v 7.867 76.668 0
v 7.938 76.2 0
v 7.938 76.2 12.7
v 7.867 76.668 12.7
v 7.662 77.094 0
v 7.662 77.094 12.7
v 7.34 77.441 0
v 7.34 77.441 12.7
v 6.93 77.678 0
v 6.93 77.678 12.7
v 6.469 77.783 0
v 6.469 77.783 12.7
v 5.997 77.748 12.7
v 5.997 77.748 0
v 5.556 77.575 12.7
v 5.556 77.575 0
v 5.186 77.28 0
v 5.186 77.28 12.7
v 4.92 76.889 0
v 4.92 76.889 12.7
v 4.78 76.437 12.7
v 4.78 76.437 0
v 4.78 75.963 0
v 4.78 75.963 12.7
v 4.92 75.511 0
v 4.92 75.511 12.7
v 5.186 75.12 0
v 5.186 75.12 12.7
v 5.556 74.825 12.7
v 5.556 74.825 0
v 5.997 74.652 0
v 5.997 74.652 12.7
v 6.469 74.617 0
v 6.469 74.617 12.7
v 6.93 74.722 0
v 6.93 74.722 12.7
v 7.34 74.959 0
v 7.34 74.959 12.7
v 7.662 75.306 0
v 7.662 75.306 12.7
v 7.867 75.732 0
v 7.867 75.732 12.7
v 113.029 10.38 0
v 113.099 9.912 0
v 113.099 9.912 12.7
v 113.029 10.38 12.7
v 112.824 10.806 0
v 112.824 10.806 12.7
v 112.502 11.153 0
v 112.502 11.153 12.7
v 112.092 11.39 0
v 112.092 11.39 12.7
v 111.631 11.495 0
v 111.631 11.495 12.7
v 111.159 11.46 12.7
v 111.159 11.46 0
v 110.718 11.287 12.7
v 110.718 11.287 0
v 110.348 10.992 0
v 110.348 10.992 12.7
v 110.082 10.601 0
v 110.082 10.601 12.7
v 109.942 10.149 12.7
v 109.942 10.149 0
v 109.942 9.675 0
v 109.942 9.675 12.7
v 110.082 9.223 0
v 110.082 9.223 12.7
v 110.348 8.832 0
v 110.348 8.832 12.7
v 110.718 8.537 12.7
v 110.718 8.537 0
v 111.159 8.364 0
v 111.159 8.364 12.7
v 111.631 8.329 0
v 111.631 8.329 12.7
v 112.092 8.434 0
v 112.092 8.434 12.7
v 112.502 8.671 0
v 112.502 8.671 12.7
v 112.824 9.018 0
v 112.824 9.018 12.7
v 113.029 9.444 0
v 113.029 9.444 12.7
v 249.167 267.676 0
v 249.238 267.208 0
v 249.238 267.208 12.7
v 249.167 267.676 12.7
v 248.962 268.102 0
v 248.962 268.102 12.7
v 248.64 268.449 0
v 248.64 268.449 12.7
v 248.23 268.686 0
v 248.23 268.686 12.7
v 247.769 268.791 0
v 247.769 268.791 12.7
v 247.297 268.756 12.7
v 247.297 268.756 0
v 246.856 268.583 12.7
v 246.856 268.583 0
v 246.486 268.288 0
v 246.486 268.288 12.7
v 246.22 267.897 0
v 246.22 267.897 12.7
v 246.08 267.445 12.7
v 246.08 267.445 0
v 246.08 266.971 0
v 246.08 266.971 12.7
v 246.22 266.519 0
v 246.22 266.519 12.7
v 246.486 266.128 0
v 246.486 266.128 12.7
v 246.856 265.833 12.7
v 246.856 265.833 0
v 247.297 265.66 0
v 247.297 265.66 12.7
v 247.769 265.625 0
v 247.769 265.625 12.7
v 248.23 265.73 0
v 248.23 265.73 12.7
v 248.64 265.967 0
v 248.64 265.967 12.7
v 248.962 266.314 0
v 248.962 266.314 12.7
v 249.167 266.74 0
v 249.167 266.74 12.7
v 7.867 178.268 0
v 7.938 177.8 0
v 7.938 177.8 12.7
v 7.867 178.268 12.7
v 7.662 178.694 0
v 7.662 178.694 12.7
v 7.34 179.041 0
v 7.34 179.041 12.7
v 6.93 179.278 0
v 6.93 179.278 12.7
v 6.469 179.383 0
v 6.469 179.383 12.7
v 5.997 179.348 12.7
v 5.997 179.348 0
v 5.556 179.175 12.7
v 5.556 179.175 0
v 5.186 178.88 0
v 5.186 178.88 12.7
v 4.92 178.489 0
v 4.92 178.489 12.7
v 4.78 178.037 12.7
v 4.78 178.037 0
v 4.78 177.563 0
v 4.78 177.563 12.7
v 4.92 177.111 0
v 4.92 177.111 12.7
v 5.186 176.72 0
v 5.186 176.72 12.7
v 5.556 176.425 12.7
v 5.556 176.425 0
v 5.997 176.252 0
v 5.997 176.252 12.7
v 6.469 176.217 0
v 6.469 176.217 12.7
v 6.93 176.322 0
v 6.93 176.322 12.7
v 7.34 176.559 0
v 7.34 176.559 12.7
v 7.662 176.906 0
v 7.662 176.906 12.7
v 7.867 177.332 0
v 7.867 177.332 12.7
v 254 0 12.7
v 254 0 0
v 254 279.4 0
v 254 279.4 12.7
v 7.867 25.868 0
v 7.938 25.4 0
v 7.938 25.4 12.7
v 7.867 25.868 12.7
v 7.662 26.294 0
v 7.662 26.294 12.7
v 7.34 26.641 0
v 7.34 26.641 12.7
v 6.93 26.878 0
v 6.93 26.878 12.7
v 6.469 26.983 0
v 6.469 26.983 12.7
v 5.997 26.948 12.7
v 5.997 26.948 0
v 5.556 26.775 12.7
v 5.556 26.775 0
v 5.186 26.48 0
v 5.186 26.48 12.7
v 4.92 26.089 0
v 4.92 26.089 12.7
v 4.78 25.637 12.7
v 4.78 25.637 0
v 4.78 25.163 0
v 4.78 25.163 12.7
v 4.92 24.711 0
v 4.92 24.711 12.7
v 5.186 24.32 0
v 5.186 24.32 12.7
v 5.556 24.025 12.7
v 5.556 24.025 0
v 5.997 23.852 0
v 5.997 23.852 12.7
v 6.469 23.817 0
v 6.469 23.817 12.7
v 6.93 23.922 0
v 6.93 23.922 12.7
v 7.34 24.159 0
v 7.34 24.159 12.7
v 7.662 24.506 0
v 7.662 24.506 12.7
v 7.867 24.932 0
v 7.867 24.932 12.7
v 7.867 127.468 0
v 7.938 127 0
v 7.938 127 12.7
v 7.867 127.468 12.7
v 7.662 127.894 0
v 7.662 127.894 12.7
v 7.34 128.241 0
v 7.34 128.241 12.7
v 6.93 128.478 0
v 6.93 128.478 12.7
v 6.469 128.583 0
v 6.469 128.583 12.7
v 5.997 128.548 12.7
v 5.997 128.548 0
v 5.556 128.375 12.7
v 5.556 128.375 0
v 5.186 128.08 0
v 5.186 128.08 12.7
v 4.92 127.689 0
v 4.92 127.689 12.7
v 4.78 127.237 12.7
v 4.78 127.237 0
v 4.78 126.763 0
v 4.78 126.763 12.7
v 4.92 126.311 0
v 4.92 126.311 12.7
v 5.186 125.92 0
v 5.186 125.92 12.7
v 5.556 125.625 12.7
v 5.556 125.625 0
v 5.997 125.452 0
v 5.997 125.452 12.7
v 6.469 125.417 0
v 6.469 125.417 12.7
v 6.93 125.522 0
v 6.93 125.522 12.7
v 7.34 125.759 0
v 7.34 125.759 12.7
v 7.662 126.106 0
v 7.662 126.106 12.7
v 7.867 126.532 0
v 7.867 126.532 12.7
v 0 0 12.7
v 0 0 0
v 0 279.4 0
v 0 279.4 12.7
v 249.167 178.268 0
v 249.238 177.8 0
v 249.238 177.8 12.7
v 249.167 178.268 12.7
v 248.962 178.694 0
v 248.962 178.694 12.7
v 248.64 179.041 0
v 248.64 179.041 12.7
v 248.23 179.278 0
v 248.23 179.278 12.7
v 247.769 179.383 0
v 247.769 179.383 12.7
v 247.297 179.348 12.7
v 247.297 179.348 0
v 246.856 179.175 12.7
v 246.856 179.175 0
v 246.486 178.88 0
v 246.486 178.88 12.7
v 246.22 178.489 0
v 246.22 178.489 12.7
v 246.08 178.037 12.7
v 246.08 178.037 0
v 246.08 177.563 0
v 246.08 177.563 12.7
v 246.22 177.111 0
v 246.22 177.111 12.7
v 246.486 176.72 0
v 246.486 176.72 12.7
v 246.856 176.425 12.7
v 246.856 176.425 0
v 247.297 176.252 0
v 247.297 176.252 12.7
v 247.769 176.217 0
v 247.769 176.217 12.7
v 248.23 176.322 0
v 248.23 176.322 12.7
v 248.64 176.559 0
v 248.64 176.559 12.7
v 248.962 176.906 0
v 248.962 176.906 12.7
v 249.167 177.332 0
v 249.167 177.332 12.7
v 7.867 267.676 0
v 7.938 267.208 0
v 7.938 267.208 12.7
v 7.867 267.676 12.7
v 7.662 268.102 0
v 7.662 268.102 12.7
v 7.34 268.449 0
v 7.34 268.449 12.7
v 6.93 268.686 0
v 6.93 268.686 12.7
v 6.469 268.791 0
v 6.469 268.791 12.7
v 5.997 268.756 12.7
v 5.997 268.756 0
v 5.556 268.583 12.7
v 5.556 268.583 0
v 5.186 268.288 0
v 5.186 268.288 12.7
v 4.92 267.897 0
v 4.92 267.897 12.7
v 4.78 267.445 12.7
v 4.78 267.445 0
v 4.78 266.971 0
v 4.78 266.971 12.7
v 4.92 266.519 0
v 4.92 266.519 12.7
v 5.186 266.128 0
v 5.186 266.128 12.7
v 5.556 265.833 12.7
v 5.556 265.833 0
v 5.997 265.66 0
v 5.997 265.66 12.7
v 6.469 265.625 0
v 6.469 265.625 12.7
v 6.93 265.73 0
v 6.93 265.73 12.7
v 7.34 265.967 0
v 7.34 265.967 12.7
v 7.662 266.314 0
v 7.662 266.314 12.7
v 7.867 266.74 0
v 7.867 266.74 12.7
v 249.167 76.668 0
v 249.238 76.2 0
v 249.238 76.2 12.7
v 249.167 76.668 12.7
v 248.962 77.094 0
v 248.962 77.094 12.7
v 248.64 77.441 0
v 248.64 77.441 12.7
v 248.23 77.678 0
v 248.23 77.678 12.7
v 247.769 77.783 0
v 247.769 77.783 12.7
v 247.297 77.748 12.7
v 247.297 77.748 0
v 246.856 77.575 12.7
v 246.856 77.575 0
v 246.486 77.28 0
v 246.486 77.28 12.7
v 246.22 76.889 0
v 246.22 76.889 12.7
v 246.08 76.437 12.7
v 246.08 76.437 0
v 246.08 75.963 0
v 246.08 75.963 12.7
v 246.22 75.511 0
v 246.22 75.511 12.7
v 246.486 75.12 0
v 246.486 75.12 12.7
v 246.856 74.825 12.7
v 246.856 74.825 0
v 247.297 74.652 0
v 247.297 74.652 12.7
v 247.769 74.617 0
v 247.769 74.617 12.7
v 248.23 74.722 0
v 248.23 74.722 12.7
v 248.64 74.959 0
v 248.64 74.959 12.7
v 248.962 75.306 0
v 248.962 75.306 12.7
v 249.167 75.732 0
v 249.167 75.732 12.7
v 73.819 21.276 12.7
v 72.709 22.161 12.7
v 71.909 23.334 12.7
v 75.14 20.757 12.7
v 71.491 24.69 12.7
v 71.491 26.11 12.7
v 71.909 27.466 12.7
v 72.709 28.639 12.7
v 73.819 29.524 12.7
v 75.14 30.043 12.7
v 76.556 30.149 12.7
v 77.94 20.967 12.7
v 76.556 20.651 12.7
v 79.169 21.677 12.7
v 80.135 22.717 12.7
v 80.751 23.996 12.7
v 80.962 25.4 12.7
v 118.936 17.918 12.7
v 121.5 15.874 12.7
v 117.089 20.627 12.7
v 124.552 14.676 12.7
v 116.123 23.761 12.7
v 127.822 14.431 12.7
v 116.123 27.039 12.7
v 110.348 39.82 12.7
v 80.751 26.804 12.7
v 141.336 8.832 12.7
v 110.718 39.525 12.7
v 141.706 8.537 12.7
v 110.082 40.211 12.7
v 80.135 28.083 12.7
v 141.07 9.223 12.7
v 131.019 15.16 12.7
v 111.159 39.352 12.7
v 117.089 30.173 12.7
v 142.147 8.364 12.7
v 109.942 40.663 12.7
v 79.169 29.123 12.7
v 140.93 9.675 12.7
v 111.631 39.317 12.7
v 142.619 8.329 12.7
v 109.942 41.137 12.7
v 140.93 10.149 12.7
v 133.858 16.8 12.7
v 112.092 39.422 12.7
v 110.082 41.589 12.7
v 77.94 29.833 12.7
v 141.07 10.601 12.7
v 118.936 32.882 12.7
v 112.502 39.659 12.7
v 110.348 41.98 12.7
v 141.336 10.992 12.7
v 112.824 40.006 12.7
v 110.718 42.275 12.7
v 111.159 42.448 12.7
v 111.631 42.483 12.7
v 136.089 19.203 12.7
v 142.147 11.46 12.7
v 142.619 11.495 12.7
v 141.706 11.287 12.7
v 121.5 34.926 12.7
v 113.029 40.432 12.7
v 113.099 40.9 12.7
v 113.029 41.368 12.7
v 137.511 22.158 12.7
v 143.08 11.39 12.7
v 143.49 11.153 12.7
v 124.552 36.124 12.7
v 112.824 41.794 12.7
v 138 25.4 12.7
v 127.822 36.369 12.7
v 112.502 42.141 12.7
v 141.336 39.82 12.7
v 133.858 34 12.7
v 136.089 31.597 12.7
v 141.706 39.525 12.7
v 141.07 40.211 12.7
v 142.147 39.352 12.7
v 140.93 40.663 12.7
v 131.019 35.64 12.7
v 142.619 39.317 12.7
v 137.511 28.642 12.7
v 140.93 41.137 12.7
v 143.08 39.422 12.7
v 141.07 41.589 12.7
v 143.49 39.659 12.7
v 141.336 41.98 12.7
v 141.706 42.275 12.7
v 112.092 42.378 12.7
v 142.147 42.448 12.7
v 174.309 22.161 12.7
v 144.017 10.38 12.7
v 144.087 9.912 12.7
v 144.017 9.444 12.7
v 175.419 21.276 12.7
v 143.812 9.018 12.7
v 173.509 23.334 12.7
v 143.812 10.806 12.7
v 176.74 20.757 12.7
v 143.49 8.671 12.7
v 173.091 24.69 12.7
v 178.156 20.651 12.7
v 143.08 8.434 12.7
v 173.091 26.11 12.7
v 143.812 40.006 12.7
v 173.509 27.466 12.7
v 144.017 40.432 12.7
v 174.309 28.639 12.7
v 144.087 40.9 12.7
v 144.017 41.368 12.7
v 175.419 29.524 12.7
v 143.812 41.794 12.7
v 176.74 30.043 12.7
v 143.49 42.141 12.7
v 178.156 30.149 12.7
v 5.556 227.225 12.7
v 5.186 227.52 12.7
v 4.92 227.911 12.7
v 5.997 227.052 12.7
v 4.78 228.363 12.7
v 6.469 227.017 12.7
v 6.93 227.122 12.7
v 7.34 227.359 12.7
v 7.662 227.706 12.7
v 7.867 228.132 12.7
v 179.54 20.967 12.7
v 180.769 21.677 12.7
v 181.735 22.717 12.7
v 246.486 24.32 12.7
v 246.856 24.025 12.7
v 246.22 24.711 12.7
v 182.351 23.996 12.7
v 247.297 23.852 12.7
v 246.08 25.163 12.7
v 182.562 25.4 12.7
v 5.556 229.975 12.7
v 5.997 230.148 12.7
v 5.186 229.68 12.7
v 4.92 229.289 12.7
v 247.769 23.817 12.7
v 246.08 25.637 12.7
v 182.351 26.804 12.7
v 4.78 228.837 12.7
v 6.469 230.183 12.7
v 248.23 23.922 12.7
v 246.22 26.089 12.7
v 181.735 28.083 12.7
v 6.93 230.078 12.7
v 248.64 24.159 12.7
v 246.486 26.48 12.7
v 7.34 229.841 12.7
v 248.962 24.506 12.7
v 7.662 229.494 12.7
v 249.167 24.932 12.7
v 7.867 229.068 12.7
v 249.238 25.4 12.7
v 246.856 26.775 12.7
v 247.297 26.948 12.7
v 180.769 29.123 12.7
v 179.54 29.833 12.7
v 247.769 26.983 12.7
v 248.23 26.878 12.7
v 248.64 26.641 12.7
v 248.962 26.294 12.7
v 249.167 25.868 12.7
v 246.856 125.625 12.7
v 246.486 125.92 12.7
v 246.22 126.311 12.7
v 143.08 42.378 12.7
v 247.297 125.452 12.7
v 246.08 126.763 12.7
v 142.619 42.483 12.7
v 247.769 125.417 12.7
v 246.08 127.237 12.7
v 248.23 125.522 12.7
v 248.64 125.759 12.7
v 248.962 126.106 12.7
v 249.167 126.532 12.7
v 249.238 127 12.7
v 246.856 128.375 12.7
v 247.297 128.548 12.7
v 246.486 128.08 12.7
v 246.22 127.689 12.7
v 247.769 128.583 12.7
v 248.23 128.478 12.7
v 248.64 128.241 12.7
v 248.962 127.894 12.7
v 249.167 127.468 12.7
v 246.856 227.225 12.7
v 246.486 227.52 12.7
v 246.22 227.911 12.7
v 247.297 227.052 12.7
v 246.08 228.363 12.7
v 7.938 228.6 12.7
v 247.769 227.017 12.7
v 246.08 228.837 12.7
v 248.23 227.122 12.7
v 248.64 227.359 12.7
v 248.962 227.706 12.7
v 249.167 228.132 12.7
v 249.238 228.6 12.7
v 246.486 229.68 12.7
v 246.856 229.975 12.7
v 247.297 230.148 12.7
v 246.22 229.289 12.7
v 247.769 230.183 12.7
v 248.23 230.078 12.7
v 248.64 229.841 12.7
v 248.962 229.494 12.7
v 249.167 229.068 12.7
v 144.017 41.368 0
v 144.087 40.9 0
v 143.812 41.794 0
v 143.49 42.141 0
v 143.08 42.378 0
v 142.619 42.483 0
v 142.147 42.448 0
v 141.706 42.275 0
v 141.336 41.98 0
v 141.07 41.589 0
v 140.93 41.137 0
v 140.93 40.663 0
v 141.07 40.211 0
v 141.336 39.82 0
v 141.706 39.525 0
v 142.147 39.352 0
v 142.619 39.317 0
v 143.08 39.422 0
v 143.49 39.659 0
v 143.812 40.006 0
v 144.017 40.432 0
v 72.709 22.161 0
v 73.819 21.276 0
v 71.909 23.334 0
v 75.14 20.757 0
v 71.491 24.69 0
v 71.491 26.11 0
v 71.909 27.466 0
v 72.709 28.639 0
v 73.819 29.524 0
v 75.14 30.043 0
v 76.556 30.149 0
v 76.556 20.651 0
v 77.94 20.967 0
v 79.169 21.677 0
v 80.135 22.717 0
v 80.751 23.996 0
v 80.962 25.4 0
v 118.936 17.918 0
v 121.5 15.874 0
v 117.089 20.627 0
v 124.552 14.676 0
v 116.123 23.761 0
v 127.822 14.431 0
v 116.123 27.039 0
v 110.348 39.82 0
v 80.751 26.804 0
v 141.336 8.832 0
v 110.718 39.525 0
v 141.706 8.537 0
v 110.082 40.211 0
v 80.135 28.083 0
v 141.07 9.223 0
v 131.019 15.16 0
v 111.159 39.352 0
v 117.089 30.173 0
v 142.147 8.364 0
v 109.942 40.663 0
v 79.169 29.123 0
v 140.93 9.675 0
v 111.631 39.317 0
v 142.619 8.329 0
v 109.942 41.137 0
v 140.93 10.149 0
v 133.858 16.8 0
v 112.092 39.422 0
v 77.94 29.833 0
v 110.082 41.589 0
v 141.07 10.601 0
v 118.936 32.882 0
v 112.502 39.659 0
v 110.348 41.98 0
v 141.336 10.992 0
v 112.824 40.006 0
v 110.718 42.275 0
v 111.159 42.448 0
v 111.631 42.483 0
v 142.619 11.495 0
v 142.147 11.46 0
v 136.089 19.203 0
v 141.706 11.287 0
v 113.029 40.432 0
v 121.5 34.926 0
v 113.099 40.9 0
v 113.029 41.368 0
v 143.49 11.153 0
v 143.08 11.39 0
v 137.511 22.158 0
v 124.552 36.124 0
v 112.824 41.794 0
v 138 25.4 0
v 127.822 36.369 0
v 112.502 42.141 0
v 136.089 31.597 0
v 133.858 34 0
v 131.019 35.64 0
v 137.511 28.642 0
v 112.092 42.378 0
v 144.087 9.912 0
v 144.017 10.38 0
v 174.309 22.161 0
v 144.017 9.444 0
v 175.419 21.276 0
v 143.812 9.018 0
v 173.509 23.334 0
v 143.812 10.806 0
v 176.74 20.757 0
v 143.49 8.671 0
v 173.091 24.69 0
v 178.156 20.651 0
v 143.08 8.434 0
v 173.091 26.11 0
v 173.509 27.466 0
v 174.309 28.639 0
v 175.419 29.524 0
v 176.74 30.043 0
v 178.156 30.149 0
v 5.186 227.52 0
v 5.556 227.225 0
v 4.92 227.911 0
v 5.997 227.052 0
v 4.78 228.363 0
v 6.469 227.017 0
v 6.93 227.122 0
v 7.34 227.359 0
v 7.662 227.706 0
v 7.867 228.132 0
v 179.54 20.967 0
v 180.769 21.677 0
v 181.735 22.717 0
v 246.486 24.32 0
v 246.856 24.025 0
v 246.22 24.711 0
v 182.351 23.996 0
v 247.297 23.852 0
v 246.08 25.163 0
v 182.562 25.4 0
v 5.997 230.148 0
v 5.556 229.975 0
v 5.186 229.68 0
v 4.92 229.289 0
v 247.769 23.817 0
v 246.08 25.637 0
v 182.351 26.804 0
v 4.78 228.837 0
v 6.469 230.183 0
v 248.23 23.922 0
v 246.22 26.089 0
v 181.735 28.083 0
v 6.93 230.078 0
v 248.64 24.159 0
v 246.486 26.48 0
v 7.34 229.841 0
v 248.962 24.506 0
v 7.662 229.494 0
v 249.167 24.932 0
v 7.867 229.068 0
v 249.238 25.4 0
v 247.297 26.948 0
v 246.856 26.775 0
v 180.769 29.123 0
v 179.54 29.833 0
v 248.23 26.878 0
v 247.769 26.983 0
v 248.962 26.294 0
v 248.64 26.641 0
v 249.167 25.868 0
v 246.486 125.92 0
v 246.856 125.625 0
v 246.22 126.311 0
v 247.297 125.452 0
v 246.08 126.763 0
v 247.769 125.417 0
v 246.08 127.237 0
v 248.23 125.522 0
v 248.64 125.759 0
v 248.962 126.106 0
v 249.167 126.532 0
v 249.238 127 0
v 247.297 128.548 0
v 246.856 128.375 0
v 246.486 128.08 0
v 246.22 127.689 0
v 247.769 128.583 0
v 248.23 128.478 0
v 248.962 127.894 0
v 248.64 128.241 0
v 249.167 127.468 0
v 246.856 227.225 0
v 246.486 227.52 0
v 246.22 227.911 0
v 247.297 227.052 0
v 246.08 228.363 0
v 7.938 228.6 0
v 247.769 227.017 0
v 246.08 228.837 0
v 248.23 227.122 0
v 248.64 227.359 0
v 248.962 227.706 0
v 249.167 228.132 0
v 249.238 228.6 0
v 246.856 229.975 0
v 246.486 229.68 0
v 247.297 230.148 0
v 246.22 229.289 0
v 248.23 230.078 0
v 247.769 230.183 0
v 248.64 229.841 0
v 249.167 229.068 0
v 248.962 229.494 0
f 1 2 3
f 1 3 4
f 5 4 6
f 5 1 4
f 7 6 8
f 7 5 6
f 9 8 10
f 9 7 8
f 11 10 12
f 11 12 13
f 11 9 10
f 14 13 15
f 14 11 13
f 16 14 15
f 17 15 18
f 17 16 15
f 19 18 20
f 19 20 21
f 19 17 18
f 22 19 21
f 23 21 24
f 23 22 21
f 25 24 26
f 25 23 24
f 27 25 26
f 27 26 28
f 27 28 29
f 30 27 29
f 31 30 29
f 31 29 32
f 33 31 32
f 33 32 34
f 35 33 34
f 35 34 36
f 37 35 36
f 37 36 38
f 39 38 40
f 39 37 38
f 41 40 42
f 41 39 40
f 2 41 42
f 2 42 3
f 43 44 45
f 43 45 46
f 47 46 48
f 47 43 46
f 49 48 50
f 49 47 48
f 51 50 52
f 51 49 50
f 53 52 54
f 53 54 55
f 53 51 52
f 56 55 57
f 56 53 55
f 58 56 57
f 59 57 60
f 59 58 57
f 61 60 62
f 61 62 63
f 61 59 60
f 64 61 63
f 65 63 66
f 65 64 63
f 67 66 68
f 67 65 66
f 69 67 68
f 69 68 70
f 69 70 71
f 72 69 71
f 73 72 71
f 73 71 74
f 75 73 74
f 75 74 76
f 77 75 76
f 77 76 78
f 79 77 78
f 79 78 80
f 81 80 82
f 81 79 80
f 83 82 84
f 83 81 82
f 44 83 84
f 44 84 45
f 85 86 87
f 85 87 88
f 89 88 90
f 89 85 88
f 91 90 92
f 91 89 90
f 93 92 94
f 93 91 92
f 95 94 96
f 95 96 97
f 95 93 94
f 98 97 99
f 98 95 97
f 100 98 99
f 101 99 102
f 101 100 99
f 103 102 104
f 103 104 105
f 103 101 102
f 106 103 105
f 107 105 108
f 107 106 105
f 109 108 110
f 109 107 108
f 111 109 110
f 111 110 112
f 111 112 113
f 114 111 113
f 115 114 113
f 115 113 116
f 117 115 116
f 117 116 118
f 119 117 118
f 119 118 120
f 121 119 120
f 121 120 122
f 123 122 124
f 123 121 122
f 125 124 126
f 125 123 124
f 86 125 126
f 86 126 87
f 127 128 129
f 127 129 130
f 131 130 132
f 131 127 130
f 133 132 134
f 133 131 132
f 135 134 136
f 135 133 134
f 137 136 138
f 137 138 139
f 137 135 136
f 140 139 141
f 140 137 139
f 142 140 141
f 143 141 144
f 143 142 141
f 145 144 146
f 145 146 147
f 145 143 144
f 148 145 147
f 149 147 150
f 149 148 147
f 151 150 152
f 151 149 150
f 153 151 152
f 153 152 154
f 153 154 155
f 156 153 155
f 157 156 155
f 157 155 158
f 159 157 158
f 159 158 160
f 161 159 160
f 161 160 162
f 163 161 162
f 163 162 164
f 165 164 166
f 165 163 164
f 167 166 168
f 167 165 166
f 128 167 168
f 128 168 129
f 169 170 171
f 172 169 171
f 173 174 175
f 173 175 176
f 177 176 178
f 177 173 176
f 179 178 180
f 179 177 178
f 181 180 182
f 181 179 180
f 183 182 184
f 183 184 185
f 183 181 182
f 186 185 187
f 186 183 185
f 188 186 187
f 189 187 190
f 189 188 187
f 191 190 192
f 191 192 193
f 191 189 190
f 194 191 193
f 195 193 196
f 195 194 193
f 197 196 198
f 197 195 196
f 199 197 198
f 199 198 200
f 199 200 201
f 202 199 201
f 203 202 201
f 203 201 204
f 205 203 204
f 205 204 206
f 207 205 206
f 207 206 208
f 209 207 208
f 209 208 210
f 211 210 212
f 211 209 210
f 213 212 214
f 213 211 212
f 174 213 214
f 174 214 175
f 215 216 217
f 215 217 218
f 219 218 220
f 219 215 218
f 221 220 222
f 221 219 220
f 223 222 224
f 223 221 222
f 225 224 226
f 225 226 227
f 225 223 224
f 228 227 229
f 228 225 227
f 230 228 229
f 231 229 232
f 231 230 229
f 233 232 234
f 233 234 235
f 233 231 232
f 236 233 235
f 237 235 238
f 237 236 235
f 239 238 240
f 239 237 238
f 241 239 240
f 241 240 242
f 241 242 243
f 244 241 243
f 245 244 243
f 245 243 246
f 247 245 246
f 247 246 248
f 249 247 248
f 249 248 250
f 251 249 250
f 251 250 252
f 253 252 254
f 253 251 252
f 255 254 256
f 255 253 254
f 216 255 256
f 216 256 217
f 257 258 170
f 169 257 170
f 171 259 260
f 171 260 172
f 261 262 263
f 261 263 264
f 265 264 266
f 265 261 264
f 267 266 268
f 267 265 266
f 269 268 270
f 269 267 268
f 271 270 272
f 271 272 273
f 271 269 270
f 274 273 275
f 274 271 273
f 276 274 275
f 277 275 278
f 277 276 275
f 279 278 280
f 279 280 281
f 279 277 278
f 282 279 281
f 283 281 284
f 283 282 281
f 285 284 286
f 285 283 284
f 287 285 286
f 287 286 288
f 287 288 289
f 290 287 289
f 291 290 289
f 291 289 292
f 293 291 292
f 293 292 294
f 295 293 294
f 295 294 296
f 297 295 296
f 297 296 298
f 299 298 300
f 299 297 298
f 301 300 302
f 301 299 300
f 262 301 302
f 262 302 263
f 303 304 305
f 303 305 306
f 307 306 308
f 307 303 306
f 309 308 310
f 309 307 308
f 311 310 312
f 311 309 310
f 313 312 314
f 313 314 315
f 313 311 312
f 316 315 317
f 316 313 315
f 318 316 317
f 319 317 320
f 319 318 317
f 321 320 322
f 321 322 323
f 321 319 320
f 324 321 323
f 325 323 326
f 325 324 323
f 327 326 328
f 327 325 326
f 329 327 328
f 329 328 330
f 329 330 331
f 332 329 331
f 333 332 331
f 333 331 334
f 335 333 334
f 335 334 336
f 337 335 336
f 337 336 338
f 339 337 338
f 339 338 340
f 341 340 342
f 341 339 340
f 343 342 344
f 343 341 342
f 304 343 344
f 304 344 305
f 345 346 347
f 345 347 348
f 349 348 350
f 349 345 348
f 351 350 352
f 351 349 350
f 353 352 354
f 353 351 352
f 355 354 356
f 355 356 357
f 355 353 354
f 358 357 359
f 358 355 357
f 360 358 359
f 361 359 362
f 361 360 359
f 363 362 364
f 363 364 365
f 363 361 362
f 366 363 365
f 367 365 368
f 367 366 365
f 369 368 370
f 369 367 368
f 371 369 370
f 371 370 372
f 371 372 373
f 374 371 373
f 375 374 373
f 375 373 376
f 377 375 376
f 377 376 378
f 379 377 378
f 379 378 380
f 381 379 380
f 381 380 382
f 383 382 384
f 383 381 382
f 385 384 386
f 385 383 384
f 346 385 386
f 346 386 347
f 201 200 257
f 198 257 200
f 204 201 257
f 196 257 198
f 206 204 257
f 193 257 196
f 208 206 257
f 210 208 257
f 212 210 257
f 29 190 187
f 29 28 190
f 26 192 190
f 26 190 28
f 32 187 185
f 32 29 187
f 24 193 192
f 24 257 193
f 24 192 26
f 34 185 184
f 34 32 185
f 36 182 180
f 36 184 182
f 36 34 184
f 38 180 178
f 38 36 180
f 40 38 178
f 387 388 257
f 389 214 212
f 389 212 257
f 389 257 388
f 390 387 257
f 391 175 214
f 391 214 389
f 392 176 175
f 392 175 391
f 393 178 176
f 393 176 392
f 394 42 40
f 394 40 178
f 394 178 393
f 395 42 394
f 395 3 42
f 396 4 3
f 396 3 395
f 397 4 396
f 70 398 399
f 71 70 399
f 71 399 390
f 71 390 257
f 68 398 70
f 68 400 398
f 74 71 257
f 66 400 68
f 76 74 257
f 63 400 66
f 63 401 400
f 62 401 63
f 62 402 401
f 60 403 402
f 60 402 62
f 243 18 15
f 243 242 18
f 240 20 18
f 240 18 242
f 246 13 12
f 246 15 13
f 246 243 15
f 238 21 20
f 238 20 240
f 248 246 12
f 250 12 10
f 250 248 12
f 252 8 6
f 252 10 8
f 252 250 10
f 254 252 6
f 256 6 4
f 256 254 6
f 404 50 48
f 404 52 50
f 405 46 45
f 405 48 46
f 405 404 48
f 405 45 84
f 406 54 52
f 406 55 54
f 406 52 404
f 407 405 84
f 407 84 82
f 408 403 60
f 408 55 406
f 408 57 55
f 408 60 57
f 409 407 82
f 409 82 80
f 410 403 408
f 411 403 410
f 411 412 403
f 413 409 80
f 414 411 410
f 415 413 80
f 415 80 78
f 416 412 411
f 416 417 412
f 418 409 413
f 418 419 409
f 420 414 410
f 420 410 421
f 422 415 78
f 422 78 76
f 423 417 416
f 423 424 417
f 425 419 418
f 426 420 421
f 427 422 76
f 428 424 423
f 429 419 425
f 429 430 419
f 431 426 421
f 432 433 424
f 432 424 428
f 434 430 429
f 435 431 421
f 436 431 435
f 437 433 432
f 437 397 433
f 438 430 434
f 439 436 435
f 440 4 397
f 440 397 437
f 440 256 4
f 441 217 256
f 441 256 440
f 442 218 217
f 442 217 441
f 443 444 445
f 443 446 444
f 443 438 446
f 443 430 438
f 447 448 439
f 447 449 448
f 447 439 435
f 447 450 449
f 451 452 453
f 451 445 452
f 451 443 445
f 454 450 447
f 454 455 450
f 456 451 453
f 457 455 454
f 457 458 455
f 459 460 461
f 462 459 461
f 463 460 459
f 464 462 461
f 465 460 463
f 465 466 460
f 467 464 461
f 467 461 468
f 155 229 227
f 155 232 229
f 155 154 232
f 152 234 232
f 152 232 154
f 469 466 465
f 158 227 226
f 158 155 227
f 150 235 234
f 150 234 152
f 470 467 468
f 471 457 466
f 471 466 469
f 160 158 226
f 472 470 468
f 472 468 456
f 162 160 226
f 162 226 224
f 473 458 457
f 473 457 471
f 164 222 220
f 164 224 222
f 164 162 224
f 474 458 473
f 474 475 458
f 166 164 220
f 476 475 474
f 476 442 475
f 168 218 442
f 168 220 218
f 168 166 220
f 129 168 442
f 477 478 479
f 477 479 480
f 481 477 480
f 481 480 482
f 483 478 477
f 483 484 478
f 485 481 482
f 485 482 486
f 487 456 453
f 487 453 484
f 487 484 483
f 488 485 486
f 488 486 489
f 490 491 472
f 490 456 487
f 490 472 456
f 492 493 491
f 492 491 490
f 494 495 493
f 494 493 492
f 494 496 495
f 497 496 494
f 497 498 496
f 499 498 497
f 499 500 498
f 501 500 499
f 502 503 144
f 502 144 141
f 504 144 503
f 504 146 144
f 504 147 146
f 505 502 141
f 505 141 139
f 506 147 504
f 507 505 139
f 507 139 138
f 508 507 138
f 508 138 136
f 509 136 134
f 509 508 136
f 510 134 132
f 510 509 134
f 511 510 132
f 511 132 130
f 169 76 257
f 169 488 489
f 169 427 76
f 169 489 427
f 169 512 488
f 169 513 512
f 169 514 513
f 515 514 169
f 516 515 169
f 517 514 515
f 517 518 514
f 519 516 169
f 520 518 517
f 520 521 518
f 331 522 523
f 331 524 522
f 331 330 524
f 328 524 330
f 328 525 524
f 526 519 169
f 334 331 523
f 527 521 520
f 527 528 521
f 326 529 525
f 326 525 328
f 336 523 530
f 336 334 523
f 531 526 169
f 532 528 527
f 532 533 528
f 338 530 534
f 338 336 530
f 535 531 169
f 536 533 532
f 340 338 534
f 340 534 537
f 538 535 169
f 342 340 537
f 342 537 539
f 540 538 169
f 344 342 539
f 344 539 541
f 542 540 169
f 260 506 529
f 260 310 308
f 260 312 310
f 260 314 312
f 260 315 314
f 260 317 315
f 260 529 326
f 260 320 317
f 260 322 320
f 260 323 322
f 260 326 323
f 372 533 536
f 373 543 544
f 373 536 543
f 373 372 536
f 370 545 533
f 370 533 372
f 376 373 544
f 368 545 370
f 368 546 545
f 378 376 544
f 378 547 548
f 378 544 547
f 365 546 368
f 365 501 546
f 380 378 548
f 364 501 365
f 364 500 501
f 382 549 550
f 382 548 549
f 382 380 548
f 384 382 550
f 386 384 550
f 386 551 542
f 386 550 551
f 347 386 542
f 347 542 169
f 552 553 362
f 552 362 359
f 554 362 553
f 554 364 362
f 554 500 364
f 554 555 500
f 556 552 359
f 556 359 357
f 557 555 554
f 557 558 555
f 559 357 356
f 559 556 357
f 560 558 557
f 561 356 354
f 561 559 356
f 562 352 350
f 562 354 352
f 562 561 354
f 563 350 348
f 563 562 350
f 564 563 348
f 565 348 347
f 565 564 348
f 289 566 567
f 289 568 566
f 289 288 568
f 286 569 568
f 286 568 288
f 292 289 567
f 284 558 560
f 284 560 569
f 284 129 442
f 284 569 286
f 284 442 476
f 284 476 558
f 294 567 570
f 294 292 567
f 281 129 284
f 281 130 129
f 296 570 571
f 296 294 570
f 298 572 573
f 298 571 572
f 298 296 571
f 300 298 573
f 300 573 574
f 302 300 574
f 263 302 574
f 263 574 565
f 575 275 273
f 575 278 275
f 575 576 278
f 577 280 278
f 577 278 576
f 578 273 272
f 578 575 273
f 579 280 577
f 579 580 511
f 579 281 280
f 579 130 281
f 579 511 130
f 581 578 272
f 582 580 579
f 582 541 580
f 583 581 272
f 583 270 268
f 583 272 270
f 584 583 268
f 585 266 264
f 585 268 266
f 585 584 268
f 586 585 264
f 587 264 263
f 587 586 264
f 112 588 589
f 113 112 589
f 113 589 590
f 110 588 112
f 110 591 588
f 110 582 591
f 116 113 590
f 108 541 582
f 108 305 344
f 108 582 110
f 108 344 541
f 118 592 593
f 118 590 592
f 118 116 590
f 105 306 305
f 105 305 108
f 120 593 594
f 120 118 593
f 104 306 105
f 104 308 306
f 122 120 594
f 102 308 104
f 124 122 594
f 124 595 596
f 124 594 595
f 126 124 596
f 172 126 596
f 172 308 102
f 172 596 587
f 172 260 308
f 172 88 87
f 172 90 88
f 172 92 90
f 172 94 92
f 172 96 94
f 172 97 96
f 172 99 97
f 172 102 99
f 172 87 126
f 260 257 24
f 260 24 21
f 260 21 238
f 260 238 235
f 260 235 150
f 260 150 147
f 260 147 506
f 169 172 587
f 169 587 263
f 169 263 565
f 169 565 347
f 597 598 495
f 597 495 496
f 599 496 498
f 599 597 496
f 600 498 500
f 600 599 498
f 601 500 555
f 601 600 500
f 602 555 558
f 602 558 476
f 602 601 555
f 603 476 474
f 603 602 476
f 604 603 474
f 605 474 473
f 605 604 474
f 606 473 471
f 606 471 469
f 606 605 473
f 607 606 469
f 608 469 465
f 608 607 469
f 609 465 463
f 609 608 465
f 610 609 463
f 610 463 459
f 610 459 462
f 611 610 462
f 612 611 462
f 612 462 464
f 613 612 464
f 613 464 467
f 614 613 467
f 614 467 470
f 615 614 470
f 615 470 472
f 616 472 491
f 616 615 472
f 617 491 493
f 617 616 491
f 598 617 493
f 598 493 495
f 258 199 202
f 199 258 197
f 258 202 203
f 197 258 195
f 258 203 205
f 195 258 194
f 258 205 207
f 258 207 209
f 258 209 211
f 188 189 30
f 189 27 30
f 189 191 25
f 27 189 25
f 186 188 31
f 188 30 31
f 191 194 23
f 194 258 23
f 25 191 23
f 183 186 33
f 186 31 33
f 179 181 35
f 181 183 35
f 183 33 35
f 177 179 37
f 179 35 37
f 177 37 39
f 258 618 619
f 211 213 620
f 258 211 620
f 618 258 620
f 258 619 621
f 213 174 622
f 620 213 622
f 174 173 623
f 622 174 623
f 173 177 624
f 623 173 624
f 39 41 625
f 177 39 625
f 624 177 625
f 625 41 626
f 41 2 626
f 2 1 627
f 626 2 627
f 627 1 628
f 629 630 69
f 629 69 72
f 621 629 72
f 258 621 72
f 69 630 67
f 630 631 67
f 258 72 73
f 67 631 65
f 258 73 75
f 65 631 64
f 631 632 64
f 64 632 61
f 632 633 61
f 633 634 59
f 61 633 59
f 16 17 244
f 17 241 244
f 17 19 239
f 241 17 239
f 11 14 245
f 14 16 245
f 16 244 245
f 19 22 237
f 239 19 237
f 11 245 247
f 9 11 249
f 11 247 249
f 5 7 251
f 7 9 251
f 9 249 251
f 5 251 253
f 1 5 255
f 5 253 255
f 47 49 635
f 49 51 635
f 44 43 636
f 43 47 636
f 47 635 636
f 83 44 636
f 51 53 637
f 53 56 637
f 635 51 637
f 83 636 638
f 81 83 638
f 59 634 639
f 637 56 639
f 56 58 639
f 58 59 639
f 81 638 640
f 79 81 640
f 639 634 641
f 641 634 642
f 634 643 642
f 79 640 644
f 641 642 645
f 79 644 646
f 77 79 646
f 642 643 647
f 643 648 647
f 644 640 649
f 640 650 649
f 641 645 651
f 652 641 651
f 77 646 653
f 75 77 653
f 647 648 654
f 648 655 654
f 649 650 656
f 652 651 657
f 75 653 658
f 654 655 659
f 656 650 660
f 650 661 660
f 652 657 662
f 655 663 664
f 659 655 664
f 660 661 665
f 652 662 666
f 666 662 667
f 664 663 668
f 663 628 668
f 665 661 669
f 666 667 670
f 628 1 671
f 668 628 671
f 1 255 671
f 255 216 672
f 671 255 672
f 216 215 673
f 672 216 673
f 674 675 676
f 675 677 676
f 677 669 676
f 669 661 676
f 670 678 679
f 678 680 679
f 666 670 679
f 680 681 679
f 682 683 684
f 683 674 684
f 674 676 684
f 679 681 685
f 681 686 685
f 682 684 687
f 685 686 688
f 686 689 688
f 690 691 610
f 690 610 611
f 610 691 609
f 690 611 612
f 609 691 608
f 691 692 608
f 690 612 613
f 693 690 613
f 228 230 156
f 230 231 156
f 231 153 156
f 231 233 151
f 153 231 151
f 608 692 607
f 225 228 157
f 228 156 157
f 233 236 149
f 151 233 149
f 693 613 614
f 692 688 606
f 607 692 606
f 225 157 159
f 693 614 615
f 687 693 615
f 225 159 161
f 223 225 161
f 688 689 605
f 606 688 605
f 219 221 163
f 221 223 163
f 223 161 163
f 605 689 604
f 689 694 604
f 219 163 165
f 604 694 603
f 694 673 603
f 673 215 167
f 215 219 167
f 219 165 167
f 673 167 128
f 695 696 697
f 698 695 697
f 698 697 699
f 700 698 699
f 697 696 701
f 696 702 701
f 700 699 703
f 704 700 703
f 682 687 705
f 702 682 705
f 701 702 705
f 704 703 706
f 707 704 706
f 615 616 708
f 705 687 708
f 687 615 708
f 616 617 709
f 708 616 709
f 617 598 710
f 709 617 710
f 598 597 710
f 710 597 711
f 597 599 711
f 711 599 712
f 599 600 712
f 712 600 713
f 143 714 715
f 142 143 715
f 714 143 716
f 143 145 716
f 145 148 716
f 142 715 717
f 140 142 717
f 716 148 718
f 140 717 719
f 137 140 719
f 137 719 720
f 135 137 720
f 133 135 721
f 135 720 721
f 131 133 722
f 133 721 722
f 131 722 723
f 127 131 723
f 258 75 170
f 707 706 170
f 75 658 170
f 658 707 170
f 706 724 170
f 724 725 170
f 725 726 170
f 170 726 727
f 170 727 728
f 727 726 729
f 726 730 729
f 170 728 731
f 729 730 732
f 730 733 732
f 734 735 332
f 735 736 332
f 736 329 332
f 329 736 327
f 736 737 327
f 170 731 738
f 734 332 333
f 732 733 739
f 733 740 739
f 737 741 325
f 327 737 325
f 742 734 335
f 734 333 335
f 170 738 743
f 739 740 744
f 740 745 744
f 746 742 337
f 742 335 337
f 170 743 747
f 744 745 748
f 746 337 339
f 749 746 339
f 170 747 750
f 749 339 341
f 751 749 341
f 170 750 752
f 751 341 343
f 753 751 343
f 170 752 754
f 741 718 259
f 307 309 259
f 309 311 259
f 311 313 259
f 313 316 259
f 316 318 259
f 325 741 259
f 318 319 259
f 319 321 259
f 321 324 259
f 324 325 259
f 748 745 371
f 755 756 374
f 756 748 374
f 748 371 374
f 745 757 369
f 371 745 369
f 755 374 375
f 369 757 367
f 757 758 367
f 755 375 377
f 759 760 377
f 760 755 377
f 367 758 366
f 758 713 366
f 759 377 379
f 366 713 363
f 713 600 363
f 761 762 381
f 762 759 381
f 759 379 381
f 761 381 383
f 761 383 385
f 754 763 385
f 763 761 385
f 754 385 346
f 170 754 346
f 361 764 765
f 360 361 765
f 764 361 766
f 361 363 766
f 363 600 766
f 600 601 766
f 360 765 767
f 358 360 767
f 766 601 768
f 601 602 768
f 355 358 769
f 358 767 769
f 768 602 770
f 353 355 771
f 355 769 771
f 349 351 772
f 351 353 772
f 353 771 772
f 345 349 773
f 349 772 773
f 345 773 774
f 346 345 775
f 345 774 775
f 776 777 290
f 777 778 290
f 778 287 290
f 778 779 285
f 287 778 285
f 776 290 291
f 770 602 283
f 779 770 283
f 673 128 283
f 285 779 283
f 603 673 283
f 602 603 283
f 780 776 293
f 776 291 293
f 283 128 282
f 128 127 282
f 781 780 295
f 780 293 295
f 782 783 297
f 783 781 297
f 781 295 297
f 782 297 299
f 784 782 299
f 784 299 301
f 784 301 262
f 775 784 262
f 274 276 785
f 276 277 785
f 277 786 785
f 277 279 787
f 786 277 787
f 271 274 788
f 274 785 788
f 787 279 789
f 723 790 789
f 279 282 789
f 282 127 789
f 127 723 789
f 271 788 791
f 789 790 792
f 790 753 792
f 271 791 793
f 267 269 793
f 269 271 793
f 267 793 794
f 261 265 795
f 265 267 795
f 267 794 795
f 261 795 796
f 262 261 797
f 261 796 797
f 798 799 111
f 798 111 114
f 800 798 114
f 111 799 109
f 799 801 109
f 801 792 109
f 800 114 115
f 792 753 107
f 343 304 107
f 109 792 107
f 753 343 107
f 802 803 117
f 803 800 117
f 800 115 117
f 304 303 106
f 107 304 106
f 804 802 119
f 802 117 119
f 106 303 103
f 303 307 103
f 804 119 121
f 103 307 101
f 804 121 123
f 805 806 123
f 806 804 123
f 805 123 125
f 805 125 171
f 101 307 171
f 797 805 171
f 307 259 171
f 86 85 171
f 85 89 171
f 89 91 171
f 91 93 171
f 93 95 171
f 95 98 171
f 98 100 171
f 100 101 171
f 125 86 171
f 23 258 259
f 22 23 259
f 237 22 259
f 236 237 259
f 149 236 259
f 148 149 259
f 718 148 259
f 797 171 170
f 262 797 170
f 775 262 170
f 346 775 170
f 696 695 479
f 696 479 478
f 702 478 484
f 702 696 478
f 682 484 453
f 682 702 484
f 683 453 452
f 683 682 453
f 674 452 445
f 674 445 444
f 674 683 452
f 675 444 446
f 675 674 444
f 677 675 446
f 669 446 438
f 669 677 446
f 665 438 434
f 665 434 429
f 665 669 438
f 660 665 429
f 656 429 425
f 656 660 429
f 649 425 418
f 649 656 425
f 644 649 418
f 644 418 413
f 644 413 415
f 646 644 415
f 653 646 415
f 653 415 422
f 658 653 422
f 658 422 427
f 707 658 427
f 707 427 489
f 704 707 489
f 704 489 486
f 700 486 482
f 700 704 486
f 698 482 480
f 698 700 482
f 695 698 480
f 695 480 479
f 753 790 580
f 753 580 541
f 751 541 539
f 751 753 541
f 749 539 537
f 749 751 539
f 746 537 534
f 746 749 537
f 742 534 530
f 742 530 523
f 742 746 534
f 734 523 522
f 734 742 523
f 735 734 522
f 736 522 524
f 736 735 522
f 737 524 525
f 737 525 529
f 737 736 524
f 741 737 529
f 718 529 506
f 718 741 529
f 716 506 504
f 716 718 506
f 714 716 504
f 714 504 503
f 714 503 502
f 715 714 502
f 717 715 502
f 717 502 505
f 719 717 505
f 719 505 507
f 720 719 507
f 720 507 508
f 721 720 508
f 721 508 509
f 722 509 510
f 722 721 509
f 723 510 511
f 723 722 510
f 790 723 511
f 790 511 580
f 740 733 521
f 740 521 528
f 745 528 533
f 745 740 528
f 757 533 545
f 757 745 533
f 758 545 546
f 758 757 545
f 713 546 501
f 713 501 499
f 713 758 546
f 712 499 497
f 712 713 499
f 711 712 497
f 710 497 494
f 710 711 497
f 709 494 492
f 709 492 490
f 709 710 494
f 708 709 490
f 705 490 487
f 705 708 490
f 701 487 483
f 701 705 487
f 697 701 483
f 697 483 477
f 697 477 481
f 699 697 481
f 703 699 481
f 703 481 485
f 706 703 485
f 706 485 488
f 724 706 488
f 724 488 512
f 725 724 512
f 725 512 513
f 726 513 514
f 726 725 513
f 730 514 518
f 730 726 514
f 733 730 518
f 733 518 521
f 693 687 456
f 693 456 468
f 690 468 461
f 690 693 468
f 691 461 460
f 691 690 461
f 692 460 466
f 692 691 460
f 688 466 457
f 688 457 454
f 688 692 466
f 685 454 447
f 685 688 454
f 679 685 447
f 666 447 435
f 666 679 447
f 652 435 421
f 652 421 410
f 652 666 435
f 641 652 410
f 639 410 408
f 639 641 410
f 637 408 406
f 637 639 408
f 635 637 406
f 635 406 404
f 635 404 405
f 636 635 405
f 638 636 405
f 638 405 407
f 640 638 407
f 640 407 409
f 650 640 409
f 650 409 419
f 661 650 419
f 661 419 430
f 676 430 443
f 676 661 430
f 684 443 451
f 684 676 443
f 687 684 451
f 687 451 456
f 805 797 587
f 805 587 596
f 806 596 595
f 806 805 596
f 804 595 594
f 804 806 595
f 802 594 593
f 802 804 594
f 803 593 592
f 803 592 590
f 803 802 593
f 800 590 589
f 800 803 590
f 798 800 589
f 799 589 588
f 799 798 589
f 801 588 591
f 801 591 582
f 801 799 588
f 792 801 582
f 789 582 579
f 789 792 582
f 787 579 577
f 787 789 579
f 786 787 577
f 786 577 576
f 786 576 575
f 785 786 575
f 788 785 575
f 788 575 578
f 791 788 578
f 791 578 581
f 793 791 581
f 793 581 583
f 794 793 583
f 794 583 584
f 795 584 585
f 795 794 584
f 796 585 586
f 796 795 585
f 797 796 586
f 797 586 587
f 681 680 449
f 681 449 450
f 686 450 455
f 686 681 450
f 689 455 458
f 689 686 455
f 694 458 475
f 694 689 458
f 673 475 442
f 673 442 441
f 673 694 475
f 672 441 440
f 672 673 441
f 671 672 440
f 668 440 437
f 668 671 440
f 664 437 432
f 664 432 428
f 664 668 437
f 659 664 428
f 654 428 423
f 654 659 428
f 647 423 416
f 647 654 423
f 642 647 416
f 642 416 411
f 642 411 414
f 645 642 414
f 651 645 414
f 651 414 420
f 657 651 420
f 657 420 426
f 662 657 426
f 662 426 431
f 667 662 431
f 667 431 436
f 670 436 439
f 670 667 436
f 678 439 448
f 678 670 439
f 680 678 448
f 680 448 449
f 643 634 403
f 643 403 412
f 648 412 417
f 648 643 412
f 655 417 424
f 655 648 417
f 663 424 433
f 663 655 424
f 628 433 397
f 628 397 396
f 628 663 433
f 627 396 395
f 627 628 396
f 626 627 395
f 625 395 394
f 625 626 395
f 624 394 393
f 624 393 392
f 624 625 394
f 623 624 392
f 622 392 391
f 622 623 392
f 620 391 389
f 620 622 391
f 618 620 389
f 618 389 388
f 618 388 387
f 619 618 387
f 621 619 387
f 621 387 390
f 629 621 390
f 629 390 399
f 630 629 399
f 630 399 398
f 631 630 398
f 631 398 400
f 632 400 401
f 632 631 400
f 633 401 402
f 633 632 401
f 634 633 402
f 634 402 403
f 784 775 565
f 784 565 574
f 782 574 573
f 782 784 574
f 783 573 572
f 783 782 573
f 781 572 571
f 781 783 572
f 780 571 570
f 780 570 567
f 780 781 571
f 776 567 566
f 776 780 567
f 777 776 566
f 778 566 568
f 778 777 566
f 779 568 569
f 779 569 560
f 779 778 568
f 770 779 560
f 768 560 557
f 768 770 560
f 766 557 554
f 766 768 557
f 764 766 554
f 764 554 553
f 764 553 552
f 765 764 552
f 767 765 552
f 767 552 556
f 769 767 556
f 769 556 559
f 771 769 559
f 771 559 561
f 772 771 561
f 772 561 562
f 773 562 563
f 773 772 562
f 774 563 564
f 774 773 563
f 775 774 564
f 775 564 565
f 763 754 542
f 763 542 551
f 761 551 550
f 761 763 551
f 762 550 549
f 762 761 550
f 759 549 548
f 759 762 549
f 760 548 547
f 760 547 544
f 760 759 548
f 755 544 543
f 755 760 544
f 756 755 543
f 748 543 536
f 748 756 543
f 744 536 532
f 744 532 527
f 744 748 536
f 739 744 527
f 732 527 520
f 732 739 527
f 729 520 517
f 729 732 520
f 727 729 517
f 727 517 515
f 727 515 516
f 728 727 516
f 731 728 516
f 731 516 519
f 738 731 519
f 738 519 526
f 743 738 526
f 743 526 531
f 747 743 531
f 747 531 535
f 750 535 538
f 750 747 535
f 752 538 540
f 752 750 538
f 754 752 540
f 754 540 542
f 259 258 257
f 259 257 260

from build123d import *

# Parameters (mm, degrees)
SKETCH1_W           = 254
SKETCH1_H           = 279.4
SKETCH1_R           = 1.5875
SKETCH1_R_2         = 4.7625
SKETCH1_R_3         = 11
BOSS_EXTRUDE1_DEPTH = 12.7


with BuildPart() as part:
    # Sketch1 → Boss-Extrude1 (new body)
    with BuildSketch(Plane.XY):
        with Locations((127, 139.7)):
            Rectangle(SKETCH1_W, SKETCH1_H)
        with Locations((6.35, 25.4)):
            Circle(SKETCH1_R, mode=Mode.SUBTRACT)
        with Locations((247.65, 25.4)):
            Circle(SKETCH1_R, mode=Mode.SUBTRACT)
        with Locations((6.35, 76.2)):
            Circle(SKETCH1_R, mode=Mode.SUBTRACT)
        with Locations((247.65, 76.2)):
            Circle(SKETCH1_R, mode=Mode.SUBTRACT)
        with Locations((6.35, 127)):
            Circle(SKETCH1_R, mode=Mode.SUBTRACT)
        with Locations((247.65, 127)):
            Circle(SKETCH1_R, mode=Mode.SUBTRACT)
        with Locations((6.35, 177.8)):
            Circle(SKETCH1_R, mode=Mode.SUBTRACT)
        with Locations((247.65, 177.8)):
            Circle(SKETCH1_R, mode=Mode.SUBTRACT)
        with Locations((76.2, 25.4)):
            Circle(SKETCH1_R_2, mode=Mode.SUBTRACT)
        with Locations((177.8, 25.4)):
            Circle(SKETCH1_R_2, mode=Mode.SUBTRACT)
        with Locations((127, 25.4)):
            Circle(SKETCH1_R_3, mode=Mode.SUBTRACT)
        with Locations((142.499999988, 40.899999988)):
            Circle(SKETCH1_R, mode=Mode.SUBTRACT)
        with Locations((111.511999988, 40.899999988)):
            Circle(SKETCH1_R, mode=Mode.SUBTRACT)
        with Locations((142.499999988, 9.911999988)):
            Circle(SKETCH1_R, mode=Mode.SUBTRACT)
        with Locations((111.511999988, 9.911999988)):
            Circle(SKETCH1_R, mode=Mode.SUBTRACT)
        with Locations((6.35, 228.6)):
            Circle(SKETCH1_R, mode=Mode.SUBTRACT)
        with Locations((247.65, 228.6)):
            Circle(SKETCH1_R, mode=Mode.SUBTRACT)
        with Locations((6.35, 267.208)):
            Circle(SKETCH1_R, mode=Mode.SUBTRACT)
        with Locations((247.65, 267.208)):
            Circle(SKETCH1_R, mode=Mode.SUBTRACT)
    extrude(amount=BOSS_EXTRUDE1_DEPTH)


solid = part.part
